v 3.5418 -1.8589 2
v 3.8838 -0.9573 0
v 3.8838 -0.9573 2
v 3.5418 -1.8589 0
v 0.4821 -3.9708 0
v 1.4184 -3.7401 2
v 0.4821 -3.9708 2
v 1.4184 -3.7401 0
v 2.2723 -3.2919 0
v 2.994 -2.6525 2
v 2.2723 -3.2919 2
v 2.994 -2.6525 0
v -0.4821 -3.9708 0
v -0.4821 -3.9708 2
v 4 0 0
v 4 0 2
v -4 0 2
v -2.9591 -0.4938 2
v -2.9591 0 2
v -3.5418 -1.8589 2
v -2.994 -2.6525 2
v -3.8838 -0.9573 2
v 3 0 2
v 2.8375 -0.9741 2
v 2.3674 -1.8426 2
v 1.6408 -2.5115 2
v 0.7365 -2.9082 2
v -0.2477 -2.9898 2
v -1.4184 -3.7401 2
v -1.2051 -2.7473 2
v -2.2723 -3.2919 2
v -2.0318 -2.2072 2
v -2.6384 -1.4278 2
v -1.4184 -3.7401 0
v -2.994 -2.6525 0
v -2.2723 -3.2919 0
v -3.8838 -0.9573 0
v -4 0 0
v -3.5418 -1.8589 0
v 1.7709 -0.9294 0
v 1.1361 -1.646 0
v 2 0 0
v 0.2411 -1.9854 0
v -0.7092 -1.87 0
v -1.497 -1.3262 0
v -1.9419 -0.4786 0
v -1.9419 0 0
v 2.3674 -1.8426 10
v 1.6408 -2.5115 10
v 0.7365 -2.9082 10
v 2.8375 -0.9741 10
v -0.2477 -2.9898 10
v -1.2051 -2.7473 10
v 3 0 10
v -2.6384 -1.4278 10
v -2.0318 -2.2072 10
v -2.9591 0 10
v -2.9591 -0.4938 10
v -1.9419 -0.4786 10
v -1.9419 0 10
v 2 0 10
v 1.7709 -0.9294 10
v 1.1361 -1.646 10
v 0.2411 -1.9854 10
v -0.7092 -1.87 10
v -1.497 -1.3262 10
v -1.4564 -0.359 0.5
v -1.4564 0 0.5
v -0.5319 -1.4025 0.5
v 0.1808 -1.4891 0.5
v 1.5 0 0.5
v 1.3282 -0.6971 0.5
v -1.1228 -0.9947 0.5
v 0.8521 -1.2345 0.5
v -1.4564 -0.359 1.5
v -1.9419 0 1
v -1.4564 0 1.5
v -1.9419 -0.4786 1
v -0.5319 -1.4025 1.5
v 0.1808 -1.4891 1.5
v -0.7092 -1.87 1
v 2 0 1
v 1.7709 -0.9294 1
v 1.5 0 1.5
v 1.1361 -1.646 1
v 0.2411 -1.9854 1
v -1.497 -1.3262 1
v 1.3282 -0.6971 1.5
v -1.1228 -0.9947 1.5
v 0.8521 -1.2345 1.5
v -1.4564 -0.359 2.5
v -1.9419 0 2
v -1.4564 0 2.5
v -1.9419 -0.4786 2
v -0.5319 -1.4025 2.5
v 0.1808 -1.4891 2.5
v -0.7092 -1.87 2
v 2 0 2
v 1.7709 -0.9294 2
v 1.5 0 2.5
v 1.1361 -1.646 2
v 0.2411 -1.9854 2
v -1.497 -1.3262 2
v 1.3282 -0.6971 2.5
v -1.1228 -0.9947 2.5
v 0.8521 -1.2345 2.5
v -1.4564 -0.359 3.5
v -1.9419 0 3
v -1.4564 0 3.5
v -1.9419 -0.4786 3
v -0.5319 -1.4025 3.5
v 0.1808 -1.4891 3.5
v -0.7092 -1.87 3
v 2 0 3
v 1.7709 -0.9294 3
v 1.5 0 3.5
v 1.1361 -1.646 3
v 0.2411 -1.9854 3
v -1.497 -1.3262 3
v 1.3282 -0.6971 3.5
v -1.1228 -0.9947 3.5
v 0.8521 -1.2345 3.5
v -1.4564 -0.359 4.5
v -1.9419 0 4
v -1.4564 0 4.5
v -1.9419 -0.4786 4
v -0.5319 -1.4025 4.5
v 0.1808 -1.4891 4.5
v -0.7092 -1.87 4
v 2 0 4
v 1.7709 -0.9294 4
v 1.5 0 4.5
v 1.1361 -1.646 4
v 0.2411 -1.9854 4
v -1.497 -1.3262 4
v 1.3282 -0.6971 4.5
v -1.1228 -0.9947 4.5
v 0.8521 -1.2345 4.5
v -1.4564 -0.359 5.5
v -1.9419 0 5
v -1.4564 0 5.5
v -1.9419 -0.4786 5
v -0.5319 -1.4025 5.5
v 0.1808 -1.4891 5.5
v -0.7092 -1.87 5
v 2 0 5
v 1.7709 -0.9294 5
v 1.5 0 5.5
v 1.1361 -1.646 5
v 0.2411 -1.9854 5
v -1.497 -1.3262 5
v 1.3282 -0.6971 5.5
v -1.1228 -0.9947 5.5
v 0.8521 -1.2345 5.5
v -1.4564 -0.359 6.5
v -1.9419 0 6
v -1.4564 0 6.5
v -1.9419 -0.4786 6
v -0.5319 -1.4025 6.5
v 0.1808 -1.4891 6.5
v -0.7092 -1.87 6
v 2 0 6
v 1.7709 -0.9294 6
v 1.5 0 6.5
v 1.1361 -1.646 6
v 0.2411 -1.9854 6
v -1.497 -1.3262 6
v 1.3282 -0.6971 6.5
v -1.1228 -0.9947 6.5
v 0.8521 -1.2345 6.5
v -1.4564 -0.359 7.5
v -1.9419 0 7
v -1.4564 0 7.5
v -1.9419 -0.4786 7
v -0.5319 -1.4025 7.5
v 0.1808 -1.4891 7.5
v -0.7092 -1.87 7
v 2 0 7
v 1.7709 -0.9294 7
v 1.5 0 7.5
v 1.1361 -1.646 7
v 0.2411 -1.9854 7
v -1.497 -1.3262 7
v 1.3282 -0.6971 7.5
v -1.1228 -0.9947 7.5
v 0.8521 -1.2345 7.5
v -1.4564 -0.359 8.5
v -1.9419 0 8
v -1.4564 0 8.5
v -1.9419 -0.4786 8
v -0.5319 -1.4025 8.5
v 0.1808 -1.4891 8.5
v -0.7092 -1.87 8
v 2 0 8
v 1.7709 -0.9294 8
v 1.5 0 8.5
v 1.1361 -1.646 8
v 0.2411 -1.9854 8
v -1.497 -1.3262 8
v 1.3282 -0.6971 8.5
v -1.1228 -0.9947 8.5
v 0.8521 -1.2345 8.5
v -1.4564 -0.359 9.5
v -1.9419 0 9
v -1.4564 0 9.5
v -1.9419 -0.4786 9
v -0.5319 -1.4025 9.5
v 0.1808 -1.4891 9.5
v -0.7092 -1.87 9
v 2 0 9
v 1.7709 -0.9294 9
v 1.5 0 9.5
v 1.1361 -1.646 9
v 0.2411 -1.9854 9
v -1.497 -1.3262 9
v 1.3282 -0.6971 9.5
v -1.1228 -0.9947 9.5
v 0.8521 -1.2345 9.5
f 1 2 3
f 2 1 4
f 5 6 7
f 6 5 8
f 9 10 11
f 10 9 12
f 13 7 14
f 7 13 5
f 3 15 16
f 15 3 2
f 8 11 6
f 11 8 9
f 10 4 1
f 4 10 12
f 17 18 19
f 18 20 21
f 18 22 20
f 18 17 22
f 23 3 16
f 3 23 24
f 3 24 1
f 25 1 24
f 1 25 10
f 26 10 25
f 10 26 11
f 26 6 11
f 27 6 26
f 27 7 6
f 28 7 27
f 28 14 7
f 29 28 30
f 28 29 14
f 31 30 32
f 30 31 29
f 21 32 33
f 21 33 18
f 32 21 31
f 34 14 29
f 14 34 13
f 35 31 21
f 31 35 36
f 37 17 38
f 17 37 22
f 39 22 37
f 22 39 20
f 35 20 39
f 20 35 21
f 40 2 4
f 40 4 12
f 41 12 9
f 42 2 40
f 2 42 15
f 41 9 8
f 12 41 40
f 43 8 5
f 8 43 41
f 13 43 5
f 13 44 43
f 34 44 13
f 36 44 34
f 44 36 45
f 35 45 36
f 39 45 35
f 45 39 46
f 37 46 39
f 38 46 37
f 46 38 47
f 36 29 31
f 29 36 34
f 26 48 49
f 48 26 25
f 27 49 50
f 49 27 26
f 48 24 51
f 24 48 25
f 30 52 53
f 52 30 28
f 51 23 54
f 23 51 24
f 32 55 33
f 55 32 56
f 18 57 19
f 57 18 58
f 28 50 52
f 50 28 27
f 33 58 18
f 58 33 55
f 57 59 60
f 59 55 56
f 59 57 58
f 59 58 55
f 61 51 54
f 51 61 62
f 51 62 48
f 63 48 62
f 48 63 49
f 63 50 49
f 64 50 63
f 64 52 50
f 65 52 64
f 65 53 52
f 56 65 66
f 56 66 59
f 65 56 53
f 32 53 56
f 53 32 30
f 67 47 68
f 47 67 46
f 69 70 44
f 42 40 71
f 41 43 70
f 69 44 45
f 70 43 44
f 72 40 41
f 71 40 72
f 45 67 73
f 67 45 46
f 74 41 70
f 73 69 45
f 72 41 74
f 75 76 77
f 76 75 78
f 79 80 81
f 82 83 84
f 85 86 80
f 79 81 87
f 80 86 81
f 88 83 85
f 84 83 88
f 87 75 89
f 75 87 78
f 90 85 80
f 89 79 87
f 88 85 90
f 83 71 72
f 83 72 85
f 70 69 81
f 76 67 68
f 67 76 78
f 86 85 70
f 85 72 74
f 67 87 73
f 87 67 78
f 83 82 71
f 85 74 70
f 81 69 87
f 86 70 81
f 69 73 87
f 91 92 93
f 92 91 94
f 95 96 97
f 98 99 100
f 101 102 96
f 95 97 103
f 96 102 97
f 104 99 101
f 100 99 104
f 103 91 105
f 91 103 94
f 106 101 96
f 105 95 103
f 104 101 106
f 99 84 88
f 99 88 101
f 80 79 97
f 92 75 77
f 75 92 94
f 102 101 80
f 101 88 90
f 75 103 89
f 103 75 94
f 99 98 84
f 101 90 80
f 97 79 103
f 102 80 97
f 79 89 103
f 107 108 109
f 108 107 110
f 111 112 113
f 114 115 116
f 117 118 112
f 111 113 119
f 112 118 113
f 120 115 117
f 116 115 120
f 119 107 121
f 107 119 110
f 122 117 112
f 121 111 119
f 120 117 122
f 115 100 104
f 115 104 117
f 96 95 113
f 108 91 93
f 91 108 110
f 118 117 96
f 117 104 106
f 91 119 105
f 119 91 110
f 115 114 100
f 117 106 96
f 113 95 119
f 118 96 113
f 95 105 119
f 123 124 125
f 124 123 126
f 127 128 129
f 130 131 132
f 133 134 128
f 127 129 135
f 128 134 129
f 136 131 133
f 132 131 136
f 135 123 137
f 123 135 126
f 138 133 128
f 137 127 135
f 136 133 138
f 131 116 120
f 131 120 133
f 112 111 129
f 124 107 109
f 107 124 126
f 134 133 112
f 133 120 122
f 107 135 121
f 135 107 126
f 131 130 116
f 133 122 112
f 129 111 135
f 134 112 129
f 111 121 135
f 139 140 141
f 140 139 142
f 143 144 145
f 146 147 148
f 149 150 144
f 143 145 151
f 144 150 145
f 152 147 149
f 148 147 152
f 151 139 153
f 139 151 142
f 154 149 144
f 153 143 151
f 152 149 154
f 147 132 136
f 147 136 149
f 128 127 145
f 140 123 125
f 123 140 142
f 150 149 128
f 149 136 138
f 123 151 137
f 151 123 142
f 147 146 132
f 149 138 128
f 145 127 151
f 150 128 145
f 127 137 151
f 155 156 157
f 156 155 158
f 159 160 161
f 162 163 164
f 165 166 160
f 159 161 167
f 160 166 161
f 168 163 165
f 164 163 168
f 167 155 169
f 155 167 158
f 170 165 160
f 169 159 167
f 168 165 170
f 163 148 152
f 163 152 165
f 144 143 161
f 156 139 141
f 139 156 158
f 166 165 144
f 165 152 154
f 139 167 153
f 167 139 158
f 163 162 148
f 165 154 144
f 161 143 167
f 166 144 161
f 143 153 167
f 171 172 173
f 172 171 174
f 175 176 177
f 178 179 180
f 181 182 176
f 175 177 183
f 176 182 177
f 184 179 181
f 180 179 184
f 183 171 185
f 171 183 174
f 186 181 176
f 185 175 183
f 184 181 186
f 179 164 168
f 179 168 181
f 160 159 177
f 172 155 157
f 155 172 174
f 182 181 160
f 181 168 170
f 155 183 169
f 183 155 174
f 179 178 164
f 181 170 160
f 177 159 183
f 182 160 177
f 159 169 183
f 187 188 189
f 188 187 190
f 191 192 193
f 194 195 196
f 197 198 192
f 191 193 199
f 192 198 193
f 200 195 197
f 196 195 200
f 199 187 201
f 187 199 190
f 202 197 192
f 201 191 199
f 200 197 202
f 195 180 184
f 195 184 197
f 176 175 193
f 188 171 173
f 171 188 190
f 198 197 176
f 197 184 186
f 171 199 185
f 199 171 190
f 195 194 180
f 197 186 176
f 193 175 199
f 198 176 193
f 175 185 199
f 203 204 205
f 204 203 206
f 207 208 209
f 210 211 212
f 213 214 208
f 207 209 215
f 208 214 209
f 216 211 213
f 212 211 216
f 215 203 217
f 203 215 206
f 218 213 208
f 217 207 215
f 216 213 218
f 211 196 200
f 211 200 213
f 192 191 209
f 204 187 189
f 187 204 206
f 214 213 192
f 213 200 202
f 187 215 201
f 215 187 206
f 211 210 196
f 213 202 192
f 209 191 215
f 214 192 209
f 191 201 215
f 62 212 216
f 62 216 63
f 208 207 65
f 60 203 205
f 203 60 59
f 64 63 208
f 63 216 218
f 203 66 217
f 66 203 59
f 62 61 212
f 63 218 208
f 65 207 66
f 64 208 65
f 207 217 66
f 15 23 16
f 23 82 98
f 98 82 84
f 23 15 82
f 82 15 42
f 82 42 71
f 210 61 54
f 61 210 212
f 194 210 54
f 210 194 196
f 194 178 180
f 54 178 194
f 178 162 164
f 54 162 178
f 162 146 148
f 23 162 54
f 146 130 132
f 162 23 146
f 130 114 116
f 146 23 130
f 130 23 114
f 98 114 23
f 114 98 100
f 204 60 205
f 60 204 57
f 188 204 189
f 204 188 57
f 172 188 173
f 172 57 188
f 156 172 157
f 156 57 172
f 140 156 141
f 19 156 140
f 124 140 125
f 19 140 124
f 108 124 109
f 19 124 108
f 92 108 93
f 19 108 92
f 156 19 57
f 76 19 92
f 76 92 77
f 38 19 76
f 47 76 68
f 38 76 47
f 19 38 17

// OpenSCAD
$fs=1/1;
$fa=1/1;

difference() {
  union() {
    cylinder(d=8,h=2);
    translate([0,0,2]) cylinder(d=6,h=8);
  }
  for(i=[0:1:10]) translate([0,0,i]) for (m=[0,1]) mirror([0,0,m]) cylinder(d1=4,d2=3,h=0.5);
  translate([-10,0,0])cube([20,20,20]);
}
